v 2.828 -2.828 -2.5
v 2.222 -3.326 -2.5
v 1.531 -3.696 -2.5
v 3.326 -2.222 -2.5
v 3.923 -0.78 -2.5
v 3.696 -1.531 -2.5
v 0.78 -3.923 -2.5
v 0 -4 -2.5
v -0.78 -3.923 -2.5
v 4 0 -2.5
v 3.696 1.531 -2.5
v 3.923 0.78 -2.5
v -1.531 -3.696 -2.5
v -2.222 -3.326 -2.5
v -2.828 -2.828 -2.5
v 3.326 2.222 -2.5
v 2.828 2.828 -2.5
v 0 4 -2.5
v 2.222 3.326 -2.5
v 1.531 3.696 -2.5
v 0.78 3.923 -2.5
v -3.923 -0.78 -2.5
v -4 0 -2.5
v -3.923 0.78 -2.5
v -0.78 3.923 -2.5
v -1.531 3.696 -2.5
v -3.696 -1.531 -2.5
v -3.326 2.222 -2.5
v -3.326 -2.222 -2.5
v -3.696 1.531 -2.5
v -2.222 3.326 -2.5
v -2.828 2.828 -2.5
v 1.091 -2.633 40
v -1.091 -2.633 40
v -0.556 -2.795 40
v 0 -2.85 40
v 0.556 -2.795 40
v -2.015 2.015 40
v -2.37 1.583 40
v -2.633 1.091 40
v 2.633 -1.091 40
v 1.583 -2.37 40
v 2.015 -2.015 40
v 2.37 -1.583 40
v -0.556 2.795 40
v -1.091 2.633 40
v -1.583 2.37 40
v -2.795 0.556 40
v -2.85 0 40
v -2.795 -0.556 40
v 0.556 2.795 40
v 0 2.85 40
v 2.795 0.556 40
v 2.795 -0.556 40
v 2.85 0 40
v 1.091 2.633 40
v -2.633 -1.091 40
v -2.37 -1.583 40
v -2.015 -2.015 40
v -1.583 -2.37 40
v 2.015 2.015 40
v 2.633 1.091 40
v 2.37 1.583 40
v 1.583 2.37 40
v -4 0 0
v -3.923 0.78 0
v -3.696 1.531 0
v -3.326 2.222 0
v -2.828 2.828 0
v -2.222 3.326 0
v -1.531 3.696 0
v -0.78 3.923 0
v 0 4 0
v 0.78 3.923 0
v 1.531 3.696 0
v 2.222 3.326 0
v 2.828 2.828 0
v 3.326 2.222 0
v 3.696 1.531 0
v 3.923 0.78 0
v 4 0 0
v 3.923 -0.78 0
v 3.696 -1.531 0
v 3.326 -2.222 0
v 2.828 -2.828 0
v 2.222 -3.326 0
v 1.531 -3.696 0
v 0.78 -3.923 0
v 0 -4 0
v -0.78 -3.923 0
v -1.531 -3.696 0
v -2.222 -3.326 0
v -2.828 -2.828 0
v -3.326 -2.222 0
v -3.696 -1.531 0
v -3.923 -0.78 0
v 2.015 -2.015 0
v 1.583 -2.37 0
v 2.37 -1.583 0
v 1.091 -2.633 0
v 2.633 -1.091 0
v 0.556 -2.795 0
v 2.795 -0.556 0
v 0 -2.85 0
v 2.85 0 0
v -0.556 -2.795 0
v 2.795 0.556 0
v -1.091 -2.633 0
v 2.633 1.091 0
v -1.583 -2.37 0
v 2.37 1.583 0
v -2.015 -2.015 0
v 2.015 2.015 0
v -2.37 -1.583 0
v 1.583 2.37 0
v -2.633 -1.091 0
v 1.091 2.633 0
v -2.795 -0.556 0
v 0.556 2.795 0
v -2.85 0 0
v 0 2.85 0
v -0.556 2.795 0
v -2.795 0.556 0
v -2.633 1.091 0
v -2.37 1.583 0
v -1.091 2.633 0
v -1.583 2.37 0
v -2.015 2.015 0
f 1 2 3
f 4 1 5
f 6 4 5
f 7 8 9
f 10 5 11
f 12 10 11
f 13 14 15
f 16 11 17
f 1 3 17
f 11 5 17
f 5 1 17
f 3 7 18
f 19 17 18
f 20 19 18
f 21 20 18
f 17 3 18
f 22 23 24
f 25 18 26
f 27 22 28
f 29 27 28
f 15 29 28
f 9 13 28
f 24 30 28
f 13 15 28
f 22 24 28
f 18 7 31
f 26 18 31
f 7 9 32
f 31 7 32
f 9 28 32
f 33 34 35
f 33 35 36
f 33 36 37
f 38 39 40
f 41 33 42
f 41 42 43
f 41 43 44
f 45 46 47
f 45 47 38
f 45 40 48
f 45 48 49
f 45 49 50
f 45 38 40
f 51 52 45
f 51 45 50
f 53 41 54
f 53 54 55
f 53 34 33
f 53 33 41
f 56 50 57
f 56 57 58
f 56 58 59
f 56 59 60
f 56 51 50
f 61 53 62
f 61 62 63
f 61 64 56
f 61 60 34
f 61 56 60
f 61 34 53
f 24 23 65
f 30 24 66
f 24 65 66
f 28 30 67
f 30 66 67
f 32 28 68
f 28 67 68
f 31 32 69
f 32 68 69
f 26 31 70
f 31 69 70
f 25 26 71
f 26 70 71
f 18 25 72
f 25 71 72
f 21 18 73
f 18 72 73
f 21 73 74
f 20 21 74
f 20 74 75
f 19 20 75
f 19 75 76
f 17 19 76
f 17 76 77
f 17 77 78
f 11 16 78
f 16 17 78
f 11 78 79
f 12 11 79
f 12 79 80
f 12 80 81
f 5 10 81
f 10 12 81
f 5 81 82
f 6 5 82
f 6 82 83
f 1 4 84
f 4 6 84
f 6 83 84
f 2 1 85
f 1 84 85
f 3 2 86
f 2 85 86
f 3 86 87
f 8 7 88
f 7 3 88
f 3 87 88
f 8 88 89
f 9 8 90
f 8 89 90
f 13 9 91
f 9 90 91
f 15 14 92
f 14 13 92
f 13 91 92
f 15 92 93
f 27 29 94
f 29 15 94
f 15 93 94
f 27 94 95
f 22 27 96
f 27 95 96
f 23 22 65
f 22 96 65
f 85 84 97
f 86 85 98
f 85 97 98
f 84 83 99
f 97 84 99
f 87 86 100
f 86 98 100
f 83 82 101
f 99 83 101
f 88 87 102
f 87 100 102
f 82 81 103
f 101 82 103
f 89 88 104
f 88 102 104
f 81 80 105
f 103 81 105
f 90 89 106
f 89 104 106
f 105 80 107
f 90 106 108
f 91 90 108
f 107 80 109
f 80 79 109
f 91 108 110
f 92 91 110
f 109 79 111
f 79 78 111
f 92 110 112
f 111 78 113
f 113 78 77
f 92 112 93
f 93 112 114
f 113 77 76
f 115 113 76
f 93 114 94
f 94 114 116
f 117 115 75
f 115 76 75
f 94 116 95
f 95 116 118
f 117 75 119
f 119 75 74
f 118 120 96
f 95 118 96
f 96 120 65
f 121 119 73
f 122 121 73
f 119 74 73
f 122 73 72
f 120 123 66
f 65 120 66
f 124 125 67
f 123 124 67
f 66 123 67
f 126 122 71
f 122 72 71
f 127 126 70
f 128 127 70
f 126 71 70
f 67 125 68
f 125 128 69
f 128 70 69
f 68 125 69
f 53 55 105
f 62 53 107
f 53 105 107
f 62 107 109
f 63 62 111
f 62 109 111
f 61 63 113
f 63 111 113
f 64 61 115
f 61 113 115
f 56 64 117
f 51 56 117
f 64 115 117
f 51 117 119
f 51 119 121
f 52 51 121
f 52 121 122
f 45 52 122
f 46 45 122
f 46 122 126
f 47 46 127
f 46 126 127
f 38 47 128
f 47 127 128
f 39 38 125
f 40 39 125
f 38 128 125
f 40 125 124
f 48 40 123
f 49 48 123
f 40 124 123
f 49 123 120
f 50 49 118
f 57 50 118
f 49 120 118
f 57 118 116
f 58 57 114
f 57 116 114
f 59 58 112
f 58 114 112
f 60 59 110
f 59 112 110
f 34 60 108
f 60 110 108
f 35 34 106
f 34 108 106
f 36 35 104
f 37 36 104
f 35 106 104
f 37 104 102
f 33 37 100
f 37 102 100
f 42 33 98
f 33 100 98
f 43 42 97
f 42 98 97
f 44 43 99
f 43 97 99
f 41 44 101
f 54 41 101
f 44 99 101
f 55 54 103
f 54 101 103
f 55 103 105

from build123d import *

# Parameters (mm, degrees)
SKETCH1_R               = 2.85
BOSS_EXTRUDE1_DEPTH     = 40
SKETCH2_R               = 4
BOSS_EXTRUDE2_DEPTH     = 5
CUT_EXTRUDE1_DEPTH      = 10
CUT_EXTRUDE1_DEPTH_BACK = 10
SKETCH3_W               = 2.5
SKETCH3_H               = 8


with BuildPart() as part:
    # Sketch1 → Boss-Extrude1 (new body)
    with BuildSketch(Plane.XY):
        Circle(SKETCH1_R)
    extrude(amount=BOSS_EXTRUDE1_DEPTH)

    # Sketch2 → Boss-Extrude2 (add)
    with BuildSketch(Plane(origin=(0, 0, 0), x_dir=(-1, 0, 0), z_dir=(0, 0, -1))):
        Circle(SKETCH2_R)
    extrude(amount=BOSS_EXTRUDE2_DEPTH)

    # Sketch3 → Cut-Extrude1 (cut, two sides: drawn at the far end of the back side and taken through both)
    with BuildSketch(Plane(origin=(0, 0, 0), x_dir=(0, 0, -1), z_dir=(1, 0, 0)).offset(-CUT_EXTRUDE1_DEPTH_BACK)):
        with Locations((3.75, 0)):
            Rectangle(SKETCH3_W, SKETCH3_H)
    extrude(amount=CUT_EXTRUDE1_DEPTH + CUT_EXTRUDE1_DEPTH_BACK, mode=Mode.SUBTRACT)


solid = part.part
